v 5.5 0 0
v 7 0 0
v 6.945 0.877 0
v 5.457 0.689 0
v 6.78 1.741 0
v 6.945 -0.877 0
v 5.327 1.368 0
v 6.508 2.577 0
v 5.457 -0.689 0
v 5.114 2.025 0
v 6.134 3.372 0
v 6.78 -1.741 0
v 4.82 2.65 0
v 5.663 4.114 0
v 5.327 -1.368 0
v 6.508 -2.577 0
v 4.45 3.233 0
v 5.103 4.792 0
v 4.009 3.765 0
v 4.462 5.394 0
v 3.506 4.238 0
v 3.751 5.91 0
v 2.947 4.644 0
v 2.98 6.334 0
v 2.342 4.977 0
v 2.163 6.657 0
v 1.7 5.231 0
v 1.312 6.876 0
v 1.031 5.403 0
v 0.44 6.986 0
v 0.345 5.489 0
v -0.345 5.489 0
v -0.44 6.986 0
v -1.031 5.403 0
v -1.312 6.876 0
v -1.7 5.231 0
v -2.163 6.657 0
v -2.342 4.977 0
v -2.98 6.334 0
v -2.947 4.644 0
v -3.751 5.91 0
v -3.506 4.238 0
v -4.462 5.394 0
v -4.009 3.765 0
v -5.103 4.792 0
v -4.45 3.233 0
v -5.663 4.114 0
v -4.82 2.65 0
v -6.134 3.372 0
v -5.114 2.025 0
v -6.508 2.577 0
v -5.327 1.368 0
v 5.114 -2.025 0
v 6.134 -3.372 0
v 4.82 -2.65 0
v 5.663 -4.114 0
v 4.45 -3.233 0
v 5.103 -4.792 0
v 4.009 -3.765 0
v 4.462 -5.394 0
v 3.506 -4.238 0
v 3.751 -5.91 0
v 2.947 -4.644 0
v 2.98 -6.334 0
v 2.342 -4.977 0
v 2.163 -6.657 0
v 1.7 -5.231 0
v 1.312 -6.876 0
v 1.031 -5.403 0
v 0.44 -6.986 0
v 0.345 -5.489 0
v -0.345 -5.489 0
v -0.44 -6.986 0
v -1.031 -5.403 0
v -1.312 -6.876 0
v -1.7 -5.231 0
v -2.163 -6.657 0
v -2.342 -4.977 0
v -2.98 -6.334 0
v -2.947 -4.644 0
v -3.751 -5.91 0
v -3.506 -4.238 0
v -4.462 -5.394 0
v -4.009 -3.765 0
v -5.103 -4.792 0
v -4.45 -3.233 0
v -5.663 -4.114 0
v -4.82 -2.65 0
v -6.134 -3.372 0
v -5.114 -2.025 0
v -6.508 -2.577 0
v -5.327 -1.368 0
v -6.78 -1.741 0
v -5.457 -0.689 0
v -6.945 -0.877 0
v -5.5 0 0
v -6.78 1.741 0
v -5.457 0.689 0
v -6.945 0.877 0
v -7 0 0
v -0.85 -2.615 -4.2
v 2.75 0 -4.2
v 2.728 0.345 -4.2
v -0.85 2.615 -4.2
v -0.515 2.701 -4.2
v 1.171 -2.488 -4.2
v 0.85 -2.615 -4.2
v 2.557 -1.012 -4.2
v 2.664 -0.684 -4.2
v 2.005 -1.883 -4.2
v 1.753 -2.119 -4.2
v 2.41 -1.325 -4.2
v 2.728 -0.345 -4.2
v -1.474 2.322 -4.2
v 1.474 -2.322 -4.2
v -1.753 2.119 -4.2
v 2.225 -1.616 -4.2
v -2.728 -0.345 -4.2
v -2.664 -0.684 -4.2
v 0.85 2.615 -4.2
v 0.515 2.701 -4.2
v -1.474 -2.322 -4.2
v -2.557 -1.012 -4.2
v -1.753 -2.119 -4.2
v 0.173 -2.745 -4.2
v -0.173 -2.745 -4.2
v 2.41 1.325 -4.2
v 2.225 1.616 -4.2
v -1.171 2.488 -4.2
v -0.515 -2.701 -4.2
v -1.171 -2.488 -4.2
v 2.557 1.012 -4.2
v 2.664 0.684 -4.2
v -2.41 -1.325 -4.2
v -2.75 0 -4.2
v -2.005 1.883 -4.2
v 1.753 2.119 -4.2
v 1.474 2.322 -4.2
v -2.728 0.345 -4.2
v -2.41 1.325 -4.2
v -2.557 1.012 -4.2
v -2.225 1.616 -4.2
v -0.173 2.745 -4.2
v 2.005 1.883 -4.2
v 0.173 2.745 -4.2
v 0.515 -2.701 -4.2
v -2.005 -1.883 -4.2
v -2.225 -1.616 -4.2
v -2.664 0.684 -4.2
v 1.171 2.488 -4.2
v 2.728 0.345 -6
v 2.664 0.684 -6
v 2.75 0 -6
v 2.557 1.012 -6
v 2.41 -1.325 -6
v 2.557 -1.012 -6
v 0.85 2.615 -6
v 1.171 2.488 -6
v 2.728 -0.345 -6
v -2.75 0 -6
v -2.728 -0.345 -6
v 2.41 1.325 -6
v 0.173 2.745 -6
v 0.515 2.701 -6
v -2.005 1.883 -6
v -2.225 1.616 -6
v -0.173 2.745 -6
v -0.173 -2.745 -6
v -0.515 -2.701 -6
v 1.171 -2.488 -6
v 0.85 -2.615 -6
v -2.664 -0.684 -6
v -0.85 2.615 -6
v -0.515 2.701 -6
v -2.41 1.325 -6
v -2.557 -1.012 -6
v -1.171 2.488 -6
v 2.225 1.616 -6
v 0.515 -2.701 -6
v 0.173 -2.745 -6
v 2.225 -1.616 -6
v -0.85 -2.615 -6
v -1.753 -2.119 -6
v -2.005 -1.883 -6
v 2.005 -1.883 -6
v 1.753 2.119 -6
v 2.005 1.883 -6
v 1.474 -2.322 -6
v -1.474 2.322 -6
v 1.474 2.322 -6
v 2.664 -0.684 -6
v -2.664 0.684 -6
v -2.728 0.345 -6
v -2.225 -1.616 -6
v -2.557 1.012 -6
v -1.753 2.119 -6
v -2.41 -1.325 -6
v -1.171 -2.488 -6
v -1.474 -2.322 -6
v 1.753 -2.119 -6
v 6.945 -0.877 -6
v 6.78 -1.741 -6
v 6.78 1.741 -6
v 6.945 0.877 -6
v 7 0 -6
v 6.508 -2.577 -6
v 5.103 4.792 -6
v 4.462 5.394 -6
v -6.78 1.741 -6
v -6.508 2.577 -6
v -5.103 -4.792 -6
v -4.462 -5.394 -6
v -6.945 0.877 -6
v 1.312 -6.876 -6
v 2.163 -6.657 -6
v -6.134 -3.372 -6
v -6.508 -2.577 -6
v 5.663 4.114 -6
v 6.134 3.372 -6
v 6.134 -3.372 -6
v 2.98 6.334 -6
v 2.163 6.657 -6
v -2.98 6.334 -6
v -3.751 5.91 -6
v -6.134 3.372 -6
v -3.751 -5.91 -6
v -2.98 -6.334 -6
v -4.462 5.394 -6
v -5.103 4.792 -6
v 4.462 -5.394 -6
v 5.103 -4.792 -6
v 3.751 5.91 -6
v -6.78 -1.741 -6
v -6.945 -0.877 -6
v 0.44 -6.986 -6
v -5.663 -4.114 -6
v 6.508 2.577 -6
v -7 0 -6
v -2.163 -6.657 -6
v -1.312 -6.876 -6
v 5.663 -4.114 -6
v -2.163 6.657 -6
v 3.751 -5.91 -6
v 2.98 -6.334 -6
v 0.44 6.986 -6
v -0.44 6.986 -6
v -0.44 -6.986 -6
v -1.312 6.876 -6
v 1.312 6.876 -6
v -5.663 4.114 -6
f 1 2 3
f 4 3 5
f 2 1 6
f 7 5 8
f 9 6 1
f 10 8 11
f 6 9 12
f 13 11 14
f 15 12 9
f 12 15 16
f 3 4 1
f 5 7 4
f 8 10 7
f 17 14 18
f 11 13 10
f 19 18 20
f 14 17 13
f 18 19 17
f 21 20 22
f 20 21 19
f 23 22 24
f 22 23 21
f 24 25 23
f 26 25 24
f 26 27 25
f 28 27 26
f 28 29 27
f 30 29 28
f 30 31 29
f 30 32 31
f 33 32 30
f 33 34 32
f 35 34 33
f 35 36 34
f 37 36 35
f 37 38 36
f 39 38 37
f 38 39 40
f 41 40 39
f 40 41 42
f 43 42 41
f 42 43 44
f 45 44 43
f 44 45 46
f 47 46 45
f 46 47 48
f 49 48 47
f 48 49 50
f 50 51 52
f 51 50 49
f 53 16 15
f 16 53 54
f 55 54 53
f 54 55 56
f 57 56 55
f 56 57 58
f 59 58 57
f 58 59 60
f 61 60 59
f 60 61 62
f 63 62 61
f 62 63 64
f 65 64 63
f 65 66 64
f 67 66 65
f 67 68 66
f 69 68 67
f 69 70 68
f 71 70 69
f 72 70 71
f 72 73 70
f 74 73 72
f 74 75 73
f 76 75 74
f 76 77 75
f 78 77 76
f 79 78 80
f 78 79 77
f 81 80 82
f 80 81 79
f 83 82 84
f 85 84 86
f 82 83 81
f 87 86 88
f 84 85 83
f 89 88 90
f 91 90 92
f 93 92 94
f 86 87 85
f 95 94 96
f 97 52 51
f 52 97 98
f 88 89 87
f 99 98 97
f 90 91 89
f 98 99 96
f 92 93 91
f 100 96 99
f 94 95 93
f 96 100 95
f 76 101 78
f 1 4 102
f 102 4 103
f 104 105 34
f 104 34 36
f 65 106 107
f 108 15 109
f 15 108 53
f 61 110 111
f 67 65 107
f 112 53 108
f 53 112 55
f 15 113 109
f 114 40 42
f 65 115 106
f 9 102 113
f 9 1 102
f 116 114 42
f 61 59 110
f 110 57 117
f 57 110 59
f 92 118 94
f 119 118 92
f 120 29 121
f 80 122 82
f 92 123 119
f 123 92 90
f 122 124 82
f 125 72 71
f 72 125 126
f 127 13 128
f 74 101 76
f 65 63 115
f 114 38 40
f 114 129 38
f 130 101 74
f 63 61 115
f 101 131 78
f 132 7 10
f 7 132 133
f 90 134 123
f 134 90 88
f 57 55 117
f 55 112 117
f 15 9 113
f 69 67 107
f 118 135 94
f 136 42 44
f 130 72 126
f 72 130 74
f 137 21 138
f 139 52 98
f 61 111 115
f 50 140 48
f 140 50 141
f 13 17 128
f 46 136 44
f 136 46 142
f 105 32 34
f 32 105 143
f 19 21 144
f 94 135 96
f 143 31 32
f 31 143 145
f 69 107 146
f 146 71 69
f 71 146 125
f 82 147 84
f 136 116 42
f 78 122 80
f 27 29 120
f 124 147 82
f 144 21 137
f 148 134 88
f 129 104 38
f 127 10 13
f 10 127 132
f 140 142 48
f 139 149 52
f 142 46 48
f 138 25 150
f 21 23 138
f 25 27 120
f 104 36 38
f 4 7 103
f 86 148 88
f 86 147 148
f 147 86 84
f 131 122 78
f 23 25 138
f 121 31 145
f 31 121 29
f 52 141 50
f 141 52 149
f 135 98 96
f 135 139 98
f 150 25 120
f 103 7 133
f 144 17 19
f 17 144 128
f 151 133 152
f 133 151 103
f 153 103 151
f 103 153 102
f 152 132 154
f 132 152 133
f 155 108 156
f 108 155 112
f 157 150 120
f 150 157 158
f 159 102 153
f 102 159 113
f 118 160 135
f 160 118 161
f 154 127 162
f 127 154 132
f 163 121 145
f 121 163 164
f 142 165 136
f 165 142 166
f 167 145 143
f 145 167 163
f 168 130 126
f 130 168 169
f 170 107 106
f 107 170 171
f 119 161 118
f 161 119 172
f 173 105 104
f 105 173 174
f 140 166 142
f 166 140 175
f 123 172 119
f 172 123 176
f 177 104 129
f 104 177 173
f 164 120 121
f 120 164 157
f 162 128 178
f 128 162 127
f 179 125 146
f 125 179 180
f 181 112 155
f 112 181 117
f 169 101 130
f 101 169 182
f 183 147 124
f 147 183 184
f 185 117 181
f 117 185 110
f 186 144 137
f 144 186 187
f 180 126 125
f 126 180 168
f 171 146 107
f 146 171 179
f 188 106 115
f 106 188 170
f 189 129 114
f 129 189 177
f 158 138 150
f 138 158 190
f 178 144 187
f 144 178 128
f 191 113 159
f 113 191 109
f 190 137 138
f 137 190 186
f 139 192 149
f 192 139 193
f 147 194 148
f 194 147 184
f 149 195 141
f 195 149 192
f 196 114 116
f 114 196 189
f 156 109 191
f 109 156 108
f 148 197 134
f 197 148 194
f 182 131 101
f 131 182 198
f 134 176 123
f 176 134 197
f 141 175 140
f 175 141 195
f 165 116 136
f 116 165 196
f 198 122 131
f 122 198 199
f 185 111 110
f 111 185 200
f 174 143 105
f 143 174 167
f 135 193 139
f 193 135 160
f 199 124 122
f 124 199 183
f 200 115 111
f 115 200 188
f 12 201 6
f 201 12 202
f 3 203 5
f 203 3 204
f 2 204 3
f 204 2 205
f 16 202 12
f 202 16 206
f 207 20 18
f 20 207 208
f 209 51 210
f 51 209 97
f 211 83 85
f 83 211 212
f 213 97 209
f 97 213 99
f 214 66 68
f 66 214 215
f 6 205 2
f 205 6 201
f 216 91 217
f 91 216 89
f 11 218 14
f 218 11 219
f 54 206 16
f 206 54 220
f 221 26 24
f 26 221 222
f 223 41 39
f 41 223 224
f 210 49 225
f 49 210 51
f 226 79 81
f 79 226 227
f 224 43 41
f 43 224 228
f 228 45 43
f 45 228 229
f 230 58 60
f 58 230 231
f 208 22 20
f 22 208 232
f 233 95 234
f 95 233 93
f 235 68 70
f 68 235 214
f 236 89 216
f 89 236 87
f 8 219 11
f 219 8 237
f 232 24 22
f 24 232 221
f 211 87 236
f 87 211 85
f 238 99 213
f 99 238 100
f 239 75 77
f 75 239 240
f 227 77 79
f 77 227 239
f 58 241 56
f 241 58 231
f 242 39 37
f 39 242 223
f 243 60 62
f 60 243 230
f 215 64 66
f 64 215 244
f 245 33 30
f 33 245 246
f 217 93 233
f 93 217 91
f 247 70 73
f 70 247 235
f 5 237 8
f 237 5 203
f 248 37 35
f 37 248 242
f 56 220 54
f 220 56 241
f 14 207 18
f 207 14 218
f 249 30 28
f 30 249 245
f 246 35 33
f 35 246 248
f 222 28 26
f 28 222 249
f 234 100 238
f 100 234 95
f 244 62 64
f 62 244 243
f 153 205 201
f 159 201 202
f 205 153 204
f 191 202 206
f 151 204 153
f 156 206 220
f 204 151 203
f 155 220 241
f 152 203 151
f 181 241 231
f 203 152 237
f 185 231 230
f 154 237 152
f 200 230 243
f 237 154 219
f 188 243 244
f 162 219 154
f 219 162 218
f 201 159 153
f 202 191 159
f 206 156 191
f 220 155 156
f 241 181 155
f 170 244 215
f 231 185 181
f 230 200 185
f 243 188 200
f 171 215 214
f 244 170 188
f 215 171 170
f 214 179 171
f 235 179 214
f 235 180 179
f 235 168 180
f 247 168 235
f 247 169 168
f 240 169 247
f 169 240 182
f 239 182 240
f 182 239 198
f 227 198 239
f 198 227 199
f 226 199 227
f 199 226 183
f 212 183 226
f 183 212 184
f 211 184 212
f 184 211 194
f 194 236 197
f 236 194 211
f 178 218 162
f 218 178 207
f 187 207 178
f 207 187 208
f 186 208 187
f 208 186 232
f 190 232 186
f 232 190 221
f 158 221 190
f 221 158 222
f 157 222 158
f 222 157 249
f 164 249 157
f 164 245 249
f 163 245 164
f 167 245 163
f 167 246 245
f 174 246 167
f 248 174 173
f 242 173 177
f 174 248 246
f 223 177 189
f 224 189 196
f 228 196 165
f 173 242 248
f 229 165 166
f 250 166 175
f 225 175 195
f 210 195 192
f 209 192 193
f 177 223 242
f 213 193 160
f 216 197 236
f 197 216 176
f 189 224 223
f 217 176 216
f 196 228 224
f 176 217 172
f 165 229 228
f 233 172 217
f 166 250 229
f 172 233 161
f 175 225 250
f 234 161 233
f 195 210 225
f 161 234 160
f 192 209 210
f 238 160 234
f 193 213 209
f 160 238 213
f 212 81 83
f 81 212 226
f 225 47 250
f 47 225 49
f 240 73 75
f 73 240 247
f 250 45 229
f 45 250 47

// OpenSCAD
$fn = 50;

difference() {
	union() {
		translate(v = [0, 0, -6.0]) {
			cylinder(h = 6, r = 7.0);
		}
	}
	union() {
		translate(v = [0, 0, 0]) {
			rotate(a = [0, 0, 0]) {
				difference() {
					union() {
						translate(v = [0, 0, -9.0]) {
							cylinder(h = 9, r = 2.25);
						}
						translate(v = [0, 0, -4.2]) {
							cylinder(h = 4.2, r1 = 2.75, r2 = 5.5);
						}
						translate(v = [0, 0, -9.0]) {
							cylinder(h = 9, r = 2.75);
						}
						translate(v = [0, 0, -9.0]) {
							cylinder(h = 9, r = 2.25);
						}
					}
					union();
				}
			}
		}
	}
}
